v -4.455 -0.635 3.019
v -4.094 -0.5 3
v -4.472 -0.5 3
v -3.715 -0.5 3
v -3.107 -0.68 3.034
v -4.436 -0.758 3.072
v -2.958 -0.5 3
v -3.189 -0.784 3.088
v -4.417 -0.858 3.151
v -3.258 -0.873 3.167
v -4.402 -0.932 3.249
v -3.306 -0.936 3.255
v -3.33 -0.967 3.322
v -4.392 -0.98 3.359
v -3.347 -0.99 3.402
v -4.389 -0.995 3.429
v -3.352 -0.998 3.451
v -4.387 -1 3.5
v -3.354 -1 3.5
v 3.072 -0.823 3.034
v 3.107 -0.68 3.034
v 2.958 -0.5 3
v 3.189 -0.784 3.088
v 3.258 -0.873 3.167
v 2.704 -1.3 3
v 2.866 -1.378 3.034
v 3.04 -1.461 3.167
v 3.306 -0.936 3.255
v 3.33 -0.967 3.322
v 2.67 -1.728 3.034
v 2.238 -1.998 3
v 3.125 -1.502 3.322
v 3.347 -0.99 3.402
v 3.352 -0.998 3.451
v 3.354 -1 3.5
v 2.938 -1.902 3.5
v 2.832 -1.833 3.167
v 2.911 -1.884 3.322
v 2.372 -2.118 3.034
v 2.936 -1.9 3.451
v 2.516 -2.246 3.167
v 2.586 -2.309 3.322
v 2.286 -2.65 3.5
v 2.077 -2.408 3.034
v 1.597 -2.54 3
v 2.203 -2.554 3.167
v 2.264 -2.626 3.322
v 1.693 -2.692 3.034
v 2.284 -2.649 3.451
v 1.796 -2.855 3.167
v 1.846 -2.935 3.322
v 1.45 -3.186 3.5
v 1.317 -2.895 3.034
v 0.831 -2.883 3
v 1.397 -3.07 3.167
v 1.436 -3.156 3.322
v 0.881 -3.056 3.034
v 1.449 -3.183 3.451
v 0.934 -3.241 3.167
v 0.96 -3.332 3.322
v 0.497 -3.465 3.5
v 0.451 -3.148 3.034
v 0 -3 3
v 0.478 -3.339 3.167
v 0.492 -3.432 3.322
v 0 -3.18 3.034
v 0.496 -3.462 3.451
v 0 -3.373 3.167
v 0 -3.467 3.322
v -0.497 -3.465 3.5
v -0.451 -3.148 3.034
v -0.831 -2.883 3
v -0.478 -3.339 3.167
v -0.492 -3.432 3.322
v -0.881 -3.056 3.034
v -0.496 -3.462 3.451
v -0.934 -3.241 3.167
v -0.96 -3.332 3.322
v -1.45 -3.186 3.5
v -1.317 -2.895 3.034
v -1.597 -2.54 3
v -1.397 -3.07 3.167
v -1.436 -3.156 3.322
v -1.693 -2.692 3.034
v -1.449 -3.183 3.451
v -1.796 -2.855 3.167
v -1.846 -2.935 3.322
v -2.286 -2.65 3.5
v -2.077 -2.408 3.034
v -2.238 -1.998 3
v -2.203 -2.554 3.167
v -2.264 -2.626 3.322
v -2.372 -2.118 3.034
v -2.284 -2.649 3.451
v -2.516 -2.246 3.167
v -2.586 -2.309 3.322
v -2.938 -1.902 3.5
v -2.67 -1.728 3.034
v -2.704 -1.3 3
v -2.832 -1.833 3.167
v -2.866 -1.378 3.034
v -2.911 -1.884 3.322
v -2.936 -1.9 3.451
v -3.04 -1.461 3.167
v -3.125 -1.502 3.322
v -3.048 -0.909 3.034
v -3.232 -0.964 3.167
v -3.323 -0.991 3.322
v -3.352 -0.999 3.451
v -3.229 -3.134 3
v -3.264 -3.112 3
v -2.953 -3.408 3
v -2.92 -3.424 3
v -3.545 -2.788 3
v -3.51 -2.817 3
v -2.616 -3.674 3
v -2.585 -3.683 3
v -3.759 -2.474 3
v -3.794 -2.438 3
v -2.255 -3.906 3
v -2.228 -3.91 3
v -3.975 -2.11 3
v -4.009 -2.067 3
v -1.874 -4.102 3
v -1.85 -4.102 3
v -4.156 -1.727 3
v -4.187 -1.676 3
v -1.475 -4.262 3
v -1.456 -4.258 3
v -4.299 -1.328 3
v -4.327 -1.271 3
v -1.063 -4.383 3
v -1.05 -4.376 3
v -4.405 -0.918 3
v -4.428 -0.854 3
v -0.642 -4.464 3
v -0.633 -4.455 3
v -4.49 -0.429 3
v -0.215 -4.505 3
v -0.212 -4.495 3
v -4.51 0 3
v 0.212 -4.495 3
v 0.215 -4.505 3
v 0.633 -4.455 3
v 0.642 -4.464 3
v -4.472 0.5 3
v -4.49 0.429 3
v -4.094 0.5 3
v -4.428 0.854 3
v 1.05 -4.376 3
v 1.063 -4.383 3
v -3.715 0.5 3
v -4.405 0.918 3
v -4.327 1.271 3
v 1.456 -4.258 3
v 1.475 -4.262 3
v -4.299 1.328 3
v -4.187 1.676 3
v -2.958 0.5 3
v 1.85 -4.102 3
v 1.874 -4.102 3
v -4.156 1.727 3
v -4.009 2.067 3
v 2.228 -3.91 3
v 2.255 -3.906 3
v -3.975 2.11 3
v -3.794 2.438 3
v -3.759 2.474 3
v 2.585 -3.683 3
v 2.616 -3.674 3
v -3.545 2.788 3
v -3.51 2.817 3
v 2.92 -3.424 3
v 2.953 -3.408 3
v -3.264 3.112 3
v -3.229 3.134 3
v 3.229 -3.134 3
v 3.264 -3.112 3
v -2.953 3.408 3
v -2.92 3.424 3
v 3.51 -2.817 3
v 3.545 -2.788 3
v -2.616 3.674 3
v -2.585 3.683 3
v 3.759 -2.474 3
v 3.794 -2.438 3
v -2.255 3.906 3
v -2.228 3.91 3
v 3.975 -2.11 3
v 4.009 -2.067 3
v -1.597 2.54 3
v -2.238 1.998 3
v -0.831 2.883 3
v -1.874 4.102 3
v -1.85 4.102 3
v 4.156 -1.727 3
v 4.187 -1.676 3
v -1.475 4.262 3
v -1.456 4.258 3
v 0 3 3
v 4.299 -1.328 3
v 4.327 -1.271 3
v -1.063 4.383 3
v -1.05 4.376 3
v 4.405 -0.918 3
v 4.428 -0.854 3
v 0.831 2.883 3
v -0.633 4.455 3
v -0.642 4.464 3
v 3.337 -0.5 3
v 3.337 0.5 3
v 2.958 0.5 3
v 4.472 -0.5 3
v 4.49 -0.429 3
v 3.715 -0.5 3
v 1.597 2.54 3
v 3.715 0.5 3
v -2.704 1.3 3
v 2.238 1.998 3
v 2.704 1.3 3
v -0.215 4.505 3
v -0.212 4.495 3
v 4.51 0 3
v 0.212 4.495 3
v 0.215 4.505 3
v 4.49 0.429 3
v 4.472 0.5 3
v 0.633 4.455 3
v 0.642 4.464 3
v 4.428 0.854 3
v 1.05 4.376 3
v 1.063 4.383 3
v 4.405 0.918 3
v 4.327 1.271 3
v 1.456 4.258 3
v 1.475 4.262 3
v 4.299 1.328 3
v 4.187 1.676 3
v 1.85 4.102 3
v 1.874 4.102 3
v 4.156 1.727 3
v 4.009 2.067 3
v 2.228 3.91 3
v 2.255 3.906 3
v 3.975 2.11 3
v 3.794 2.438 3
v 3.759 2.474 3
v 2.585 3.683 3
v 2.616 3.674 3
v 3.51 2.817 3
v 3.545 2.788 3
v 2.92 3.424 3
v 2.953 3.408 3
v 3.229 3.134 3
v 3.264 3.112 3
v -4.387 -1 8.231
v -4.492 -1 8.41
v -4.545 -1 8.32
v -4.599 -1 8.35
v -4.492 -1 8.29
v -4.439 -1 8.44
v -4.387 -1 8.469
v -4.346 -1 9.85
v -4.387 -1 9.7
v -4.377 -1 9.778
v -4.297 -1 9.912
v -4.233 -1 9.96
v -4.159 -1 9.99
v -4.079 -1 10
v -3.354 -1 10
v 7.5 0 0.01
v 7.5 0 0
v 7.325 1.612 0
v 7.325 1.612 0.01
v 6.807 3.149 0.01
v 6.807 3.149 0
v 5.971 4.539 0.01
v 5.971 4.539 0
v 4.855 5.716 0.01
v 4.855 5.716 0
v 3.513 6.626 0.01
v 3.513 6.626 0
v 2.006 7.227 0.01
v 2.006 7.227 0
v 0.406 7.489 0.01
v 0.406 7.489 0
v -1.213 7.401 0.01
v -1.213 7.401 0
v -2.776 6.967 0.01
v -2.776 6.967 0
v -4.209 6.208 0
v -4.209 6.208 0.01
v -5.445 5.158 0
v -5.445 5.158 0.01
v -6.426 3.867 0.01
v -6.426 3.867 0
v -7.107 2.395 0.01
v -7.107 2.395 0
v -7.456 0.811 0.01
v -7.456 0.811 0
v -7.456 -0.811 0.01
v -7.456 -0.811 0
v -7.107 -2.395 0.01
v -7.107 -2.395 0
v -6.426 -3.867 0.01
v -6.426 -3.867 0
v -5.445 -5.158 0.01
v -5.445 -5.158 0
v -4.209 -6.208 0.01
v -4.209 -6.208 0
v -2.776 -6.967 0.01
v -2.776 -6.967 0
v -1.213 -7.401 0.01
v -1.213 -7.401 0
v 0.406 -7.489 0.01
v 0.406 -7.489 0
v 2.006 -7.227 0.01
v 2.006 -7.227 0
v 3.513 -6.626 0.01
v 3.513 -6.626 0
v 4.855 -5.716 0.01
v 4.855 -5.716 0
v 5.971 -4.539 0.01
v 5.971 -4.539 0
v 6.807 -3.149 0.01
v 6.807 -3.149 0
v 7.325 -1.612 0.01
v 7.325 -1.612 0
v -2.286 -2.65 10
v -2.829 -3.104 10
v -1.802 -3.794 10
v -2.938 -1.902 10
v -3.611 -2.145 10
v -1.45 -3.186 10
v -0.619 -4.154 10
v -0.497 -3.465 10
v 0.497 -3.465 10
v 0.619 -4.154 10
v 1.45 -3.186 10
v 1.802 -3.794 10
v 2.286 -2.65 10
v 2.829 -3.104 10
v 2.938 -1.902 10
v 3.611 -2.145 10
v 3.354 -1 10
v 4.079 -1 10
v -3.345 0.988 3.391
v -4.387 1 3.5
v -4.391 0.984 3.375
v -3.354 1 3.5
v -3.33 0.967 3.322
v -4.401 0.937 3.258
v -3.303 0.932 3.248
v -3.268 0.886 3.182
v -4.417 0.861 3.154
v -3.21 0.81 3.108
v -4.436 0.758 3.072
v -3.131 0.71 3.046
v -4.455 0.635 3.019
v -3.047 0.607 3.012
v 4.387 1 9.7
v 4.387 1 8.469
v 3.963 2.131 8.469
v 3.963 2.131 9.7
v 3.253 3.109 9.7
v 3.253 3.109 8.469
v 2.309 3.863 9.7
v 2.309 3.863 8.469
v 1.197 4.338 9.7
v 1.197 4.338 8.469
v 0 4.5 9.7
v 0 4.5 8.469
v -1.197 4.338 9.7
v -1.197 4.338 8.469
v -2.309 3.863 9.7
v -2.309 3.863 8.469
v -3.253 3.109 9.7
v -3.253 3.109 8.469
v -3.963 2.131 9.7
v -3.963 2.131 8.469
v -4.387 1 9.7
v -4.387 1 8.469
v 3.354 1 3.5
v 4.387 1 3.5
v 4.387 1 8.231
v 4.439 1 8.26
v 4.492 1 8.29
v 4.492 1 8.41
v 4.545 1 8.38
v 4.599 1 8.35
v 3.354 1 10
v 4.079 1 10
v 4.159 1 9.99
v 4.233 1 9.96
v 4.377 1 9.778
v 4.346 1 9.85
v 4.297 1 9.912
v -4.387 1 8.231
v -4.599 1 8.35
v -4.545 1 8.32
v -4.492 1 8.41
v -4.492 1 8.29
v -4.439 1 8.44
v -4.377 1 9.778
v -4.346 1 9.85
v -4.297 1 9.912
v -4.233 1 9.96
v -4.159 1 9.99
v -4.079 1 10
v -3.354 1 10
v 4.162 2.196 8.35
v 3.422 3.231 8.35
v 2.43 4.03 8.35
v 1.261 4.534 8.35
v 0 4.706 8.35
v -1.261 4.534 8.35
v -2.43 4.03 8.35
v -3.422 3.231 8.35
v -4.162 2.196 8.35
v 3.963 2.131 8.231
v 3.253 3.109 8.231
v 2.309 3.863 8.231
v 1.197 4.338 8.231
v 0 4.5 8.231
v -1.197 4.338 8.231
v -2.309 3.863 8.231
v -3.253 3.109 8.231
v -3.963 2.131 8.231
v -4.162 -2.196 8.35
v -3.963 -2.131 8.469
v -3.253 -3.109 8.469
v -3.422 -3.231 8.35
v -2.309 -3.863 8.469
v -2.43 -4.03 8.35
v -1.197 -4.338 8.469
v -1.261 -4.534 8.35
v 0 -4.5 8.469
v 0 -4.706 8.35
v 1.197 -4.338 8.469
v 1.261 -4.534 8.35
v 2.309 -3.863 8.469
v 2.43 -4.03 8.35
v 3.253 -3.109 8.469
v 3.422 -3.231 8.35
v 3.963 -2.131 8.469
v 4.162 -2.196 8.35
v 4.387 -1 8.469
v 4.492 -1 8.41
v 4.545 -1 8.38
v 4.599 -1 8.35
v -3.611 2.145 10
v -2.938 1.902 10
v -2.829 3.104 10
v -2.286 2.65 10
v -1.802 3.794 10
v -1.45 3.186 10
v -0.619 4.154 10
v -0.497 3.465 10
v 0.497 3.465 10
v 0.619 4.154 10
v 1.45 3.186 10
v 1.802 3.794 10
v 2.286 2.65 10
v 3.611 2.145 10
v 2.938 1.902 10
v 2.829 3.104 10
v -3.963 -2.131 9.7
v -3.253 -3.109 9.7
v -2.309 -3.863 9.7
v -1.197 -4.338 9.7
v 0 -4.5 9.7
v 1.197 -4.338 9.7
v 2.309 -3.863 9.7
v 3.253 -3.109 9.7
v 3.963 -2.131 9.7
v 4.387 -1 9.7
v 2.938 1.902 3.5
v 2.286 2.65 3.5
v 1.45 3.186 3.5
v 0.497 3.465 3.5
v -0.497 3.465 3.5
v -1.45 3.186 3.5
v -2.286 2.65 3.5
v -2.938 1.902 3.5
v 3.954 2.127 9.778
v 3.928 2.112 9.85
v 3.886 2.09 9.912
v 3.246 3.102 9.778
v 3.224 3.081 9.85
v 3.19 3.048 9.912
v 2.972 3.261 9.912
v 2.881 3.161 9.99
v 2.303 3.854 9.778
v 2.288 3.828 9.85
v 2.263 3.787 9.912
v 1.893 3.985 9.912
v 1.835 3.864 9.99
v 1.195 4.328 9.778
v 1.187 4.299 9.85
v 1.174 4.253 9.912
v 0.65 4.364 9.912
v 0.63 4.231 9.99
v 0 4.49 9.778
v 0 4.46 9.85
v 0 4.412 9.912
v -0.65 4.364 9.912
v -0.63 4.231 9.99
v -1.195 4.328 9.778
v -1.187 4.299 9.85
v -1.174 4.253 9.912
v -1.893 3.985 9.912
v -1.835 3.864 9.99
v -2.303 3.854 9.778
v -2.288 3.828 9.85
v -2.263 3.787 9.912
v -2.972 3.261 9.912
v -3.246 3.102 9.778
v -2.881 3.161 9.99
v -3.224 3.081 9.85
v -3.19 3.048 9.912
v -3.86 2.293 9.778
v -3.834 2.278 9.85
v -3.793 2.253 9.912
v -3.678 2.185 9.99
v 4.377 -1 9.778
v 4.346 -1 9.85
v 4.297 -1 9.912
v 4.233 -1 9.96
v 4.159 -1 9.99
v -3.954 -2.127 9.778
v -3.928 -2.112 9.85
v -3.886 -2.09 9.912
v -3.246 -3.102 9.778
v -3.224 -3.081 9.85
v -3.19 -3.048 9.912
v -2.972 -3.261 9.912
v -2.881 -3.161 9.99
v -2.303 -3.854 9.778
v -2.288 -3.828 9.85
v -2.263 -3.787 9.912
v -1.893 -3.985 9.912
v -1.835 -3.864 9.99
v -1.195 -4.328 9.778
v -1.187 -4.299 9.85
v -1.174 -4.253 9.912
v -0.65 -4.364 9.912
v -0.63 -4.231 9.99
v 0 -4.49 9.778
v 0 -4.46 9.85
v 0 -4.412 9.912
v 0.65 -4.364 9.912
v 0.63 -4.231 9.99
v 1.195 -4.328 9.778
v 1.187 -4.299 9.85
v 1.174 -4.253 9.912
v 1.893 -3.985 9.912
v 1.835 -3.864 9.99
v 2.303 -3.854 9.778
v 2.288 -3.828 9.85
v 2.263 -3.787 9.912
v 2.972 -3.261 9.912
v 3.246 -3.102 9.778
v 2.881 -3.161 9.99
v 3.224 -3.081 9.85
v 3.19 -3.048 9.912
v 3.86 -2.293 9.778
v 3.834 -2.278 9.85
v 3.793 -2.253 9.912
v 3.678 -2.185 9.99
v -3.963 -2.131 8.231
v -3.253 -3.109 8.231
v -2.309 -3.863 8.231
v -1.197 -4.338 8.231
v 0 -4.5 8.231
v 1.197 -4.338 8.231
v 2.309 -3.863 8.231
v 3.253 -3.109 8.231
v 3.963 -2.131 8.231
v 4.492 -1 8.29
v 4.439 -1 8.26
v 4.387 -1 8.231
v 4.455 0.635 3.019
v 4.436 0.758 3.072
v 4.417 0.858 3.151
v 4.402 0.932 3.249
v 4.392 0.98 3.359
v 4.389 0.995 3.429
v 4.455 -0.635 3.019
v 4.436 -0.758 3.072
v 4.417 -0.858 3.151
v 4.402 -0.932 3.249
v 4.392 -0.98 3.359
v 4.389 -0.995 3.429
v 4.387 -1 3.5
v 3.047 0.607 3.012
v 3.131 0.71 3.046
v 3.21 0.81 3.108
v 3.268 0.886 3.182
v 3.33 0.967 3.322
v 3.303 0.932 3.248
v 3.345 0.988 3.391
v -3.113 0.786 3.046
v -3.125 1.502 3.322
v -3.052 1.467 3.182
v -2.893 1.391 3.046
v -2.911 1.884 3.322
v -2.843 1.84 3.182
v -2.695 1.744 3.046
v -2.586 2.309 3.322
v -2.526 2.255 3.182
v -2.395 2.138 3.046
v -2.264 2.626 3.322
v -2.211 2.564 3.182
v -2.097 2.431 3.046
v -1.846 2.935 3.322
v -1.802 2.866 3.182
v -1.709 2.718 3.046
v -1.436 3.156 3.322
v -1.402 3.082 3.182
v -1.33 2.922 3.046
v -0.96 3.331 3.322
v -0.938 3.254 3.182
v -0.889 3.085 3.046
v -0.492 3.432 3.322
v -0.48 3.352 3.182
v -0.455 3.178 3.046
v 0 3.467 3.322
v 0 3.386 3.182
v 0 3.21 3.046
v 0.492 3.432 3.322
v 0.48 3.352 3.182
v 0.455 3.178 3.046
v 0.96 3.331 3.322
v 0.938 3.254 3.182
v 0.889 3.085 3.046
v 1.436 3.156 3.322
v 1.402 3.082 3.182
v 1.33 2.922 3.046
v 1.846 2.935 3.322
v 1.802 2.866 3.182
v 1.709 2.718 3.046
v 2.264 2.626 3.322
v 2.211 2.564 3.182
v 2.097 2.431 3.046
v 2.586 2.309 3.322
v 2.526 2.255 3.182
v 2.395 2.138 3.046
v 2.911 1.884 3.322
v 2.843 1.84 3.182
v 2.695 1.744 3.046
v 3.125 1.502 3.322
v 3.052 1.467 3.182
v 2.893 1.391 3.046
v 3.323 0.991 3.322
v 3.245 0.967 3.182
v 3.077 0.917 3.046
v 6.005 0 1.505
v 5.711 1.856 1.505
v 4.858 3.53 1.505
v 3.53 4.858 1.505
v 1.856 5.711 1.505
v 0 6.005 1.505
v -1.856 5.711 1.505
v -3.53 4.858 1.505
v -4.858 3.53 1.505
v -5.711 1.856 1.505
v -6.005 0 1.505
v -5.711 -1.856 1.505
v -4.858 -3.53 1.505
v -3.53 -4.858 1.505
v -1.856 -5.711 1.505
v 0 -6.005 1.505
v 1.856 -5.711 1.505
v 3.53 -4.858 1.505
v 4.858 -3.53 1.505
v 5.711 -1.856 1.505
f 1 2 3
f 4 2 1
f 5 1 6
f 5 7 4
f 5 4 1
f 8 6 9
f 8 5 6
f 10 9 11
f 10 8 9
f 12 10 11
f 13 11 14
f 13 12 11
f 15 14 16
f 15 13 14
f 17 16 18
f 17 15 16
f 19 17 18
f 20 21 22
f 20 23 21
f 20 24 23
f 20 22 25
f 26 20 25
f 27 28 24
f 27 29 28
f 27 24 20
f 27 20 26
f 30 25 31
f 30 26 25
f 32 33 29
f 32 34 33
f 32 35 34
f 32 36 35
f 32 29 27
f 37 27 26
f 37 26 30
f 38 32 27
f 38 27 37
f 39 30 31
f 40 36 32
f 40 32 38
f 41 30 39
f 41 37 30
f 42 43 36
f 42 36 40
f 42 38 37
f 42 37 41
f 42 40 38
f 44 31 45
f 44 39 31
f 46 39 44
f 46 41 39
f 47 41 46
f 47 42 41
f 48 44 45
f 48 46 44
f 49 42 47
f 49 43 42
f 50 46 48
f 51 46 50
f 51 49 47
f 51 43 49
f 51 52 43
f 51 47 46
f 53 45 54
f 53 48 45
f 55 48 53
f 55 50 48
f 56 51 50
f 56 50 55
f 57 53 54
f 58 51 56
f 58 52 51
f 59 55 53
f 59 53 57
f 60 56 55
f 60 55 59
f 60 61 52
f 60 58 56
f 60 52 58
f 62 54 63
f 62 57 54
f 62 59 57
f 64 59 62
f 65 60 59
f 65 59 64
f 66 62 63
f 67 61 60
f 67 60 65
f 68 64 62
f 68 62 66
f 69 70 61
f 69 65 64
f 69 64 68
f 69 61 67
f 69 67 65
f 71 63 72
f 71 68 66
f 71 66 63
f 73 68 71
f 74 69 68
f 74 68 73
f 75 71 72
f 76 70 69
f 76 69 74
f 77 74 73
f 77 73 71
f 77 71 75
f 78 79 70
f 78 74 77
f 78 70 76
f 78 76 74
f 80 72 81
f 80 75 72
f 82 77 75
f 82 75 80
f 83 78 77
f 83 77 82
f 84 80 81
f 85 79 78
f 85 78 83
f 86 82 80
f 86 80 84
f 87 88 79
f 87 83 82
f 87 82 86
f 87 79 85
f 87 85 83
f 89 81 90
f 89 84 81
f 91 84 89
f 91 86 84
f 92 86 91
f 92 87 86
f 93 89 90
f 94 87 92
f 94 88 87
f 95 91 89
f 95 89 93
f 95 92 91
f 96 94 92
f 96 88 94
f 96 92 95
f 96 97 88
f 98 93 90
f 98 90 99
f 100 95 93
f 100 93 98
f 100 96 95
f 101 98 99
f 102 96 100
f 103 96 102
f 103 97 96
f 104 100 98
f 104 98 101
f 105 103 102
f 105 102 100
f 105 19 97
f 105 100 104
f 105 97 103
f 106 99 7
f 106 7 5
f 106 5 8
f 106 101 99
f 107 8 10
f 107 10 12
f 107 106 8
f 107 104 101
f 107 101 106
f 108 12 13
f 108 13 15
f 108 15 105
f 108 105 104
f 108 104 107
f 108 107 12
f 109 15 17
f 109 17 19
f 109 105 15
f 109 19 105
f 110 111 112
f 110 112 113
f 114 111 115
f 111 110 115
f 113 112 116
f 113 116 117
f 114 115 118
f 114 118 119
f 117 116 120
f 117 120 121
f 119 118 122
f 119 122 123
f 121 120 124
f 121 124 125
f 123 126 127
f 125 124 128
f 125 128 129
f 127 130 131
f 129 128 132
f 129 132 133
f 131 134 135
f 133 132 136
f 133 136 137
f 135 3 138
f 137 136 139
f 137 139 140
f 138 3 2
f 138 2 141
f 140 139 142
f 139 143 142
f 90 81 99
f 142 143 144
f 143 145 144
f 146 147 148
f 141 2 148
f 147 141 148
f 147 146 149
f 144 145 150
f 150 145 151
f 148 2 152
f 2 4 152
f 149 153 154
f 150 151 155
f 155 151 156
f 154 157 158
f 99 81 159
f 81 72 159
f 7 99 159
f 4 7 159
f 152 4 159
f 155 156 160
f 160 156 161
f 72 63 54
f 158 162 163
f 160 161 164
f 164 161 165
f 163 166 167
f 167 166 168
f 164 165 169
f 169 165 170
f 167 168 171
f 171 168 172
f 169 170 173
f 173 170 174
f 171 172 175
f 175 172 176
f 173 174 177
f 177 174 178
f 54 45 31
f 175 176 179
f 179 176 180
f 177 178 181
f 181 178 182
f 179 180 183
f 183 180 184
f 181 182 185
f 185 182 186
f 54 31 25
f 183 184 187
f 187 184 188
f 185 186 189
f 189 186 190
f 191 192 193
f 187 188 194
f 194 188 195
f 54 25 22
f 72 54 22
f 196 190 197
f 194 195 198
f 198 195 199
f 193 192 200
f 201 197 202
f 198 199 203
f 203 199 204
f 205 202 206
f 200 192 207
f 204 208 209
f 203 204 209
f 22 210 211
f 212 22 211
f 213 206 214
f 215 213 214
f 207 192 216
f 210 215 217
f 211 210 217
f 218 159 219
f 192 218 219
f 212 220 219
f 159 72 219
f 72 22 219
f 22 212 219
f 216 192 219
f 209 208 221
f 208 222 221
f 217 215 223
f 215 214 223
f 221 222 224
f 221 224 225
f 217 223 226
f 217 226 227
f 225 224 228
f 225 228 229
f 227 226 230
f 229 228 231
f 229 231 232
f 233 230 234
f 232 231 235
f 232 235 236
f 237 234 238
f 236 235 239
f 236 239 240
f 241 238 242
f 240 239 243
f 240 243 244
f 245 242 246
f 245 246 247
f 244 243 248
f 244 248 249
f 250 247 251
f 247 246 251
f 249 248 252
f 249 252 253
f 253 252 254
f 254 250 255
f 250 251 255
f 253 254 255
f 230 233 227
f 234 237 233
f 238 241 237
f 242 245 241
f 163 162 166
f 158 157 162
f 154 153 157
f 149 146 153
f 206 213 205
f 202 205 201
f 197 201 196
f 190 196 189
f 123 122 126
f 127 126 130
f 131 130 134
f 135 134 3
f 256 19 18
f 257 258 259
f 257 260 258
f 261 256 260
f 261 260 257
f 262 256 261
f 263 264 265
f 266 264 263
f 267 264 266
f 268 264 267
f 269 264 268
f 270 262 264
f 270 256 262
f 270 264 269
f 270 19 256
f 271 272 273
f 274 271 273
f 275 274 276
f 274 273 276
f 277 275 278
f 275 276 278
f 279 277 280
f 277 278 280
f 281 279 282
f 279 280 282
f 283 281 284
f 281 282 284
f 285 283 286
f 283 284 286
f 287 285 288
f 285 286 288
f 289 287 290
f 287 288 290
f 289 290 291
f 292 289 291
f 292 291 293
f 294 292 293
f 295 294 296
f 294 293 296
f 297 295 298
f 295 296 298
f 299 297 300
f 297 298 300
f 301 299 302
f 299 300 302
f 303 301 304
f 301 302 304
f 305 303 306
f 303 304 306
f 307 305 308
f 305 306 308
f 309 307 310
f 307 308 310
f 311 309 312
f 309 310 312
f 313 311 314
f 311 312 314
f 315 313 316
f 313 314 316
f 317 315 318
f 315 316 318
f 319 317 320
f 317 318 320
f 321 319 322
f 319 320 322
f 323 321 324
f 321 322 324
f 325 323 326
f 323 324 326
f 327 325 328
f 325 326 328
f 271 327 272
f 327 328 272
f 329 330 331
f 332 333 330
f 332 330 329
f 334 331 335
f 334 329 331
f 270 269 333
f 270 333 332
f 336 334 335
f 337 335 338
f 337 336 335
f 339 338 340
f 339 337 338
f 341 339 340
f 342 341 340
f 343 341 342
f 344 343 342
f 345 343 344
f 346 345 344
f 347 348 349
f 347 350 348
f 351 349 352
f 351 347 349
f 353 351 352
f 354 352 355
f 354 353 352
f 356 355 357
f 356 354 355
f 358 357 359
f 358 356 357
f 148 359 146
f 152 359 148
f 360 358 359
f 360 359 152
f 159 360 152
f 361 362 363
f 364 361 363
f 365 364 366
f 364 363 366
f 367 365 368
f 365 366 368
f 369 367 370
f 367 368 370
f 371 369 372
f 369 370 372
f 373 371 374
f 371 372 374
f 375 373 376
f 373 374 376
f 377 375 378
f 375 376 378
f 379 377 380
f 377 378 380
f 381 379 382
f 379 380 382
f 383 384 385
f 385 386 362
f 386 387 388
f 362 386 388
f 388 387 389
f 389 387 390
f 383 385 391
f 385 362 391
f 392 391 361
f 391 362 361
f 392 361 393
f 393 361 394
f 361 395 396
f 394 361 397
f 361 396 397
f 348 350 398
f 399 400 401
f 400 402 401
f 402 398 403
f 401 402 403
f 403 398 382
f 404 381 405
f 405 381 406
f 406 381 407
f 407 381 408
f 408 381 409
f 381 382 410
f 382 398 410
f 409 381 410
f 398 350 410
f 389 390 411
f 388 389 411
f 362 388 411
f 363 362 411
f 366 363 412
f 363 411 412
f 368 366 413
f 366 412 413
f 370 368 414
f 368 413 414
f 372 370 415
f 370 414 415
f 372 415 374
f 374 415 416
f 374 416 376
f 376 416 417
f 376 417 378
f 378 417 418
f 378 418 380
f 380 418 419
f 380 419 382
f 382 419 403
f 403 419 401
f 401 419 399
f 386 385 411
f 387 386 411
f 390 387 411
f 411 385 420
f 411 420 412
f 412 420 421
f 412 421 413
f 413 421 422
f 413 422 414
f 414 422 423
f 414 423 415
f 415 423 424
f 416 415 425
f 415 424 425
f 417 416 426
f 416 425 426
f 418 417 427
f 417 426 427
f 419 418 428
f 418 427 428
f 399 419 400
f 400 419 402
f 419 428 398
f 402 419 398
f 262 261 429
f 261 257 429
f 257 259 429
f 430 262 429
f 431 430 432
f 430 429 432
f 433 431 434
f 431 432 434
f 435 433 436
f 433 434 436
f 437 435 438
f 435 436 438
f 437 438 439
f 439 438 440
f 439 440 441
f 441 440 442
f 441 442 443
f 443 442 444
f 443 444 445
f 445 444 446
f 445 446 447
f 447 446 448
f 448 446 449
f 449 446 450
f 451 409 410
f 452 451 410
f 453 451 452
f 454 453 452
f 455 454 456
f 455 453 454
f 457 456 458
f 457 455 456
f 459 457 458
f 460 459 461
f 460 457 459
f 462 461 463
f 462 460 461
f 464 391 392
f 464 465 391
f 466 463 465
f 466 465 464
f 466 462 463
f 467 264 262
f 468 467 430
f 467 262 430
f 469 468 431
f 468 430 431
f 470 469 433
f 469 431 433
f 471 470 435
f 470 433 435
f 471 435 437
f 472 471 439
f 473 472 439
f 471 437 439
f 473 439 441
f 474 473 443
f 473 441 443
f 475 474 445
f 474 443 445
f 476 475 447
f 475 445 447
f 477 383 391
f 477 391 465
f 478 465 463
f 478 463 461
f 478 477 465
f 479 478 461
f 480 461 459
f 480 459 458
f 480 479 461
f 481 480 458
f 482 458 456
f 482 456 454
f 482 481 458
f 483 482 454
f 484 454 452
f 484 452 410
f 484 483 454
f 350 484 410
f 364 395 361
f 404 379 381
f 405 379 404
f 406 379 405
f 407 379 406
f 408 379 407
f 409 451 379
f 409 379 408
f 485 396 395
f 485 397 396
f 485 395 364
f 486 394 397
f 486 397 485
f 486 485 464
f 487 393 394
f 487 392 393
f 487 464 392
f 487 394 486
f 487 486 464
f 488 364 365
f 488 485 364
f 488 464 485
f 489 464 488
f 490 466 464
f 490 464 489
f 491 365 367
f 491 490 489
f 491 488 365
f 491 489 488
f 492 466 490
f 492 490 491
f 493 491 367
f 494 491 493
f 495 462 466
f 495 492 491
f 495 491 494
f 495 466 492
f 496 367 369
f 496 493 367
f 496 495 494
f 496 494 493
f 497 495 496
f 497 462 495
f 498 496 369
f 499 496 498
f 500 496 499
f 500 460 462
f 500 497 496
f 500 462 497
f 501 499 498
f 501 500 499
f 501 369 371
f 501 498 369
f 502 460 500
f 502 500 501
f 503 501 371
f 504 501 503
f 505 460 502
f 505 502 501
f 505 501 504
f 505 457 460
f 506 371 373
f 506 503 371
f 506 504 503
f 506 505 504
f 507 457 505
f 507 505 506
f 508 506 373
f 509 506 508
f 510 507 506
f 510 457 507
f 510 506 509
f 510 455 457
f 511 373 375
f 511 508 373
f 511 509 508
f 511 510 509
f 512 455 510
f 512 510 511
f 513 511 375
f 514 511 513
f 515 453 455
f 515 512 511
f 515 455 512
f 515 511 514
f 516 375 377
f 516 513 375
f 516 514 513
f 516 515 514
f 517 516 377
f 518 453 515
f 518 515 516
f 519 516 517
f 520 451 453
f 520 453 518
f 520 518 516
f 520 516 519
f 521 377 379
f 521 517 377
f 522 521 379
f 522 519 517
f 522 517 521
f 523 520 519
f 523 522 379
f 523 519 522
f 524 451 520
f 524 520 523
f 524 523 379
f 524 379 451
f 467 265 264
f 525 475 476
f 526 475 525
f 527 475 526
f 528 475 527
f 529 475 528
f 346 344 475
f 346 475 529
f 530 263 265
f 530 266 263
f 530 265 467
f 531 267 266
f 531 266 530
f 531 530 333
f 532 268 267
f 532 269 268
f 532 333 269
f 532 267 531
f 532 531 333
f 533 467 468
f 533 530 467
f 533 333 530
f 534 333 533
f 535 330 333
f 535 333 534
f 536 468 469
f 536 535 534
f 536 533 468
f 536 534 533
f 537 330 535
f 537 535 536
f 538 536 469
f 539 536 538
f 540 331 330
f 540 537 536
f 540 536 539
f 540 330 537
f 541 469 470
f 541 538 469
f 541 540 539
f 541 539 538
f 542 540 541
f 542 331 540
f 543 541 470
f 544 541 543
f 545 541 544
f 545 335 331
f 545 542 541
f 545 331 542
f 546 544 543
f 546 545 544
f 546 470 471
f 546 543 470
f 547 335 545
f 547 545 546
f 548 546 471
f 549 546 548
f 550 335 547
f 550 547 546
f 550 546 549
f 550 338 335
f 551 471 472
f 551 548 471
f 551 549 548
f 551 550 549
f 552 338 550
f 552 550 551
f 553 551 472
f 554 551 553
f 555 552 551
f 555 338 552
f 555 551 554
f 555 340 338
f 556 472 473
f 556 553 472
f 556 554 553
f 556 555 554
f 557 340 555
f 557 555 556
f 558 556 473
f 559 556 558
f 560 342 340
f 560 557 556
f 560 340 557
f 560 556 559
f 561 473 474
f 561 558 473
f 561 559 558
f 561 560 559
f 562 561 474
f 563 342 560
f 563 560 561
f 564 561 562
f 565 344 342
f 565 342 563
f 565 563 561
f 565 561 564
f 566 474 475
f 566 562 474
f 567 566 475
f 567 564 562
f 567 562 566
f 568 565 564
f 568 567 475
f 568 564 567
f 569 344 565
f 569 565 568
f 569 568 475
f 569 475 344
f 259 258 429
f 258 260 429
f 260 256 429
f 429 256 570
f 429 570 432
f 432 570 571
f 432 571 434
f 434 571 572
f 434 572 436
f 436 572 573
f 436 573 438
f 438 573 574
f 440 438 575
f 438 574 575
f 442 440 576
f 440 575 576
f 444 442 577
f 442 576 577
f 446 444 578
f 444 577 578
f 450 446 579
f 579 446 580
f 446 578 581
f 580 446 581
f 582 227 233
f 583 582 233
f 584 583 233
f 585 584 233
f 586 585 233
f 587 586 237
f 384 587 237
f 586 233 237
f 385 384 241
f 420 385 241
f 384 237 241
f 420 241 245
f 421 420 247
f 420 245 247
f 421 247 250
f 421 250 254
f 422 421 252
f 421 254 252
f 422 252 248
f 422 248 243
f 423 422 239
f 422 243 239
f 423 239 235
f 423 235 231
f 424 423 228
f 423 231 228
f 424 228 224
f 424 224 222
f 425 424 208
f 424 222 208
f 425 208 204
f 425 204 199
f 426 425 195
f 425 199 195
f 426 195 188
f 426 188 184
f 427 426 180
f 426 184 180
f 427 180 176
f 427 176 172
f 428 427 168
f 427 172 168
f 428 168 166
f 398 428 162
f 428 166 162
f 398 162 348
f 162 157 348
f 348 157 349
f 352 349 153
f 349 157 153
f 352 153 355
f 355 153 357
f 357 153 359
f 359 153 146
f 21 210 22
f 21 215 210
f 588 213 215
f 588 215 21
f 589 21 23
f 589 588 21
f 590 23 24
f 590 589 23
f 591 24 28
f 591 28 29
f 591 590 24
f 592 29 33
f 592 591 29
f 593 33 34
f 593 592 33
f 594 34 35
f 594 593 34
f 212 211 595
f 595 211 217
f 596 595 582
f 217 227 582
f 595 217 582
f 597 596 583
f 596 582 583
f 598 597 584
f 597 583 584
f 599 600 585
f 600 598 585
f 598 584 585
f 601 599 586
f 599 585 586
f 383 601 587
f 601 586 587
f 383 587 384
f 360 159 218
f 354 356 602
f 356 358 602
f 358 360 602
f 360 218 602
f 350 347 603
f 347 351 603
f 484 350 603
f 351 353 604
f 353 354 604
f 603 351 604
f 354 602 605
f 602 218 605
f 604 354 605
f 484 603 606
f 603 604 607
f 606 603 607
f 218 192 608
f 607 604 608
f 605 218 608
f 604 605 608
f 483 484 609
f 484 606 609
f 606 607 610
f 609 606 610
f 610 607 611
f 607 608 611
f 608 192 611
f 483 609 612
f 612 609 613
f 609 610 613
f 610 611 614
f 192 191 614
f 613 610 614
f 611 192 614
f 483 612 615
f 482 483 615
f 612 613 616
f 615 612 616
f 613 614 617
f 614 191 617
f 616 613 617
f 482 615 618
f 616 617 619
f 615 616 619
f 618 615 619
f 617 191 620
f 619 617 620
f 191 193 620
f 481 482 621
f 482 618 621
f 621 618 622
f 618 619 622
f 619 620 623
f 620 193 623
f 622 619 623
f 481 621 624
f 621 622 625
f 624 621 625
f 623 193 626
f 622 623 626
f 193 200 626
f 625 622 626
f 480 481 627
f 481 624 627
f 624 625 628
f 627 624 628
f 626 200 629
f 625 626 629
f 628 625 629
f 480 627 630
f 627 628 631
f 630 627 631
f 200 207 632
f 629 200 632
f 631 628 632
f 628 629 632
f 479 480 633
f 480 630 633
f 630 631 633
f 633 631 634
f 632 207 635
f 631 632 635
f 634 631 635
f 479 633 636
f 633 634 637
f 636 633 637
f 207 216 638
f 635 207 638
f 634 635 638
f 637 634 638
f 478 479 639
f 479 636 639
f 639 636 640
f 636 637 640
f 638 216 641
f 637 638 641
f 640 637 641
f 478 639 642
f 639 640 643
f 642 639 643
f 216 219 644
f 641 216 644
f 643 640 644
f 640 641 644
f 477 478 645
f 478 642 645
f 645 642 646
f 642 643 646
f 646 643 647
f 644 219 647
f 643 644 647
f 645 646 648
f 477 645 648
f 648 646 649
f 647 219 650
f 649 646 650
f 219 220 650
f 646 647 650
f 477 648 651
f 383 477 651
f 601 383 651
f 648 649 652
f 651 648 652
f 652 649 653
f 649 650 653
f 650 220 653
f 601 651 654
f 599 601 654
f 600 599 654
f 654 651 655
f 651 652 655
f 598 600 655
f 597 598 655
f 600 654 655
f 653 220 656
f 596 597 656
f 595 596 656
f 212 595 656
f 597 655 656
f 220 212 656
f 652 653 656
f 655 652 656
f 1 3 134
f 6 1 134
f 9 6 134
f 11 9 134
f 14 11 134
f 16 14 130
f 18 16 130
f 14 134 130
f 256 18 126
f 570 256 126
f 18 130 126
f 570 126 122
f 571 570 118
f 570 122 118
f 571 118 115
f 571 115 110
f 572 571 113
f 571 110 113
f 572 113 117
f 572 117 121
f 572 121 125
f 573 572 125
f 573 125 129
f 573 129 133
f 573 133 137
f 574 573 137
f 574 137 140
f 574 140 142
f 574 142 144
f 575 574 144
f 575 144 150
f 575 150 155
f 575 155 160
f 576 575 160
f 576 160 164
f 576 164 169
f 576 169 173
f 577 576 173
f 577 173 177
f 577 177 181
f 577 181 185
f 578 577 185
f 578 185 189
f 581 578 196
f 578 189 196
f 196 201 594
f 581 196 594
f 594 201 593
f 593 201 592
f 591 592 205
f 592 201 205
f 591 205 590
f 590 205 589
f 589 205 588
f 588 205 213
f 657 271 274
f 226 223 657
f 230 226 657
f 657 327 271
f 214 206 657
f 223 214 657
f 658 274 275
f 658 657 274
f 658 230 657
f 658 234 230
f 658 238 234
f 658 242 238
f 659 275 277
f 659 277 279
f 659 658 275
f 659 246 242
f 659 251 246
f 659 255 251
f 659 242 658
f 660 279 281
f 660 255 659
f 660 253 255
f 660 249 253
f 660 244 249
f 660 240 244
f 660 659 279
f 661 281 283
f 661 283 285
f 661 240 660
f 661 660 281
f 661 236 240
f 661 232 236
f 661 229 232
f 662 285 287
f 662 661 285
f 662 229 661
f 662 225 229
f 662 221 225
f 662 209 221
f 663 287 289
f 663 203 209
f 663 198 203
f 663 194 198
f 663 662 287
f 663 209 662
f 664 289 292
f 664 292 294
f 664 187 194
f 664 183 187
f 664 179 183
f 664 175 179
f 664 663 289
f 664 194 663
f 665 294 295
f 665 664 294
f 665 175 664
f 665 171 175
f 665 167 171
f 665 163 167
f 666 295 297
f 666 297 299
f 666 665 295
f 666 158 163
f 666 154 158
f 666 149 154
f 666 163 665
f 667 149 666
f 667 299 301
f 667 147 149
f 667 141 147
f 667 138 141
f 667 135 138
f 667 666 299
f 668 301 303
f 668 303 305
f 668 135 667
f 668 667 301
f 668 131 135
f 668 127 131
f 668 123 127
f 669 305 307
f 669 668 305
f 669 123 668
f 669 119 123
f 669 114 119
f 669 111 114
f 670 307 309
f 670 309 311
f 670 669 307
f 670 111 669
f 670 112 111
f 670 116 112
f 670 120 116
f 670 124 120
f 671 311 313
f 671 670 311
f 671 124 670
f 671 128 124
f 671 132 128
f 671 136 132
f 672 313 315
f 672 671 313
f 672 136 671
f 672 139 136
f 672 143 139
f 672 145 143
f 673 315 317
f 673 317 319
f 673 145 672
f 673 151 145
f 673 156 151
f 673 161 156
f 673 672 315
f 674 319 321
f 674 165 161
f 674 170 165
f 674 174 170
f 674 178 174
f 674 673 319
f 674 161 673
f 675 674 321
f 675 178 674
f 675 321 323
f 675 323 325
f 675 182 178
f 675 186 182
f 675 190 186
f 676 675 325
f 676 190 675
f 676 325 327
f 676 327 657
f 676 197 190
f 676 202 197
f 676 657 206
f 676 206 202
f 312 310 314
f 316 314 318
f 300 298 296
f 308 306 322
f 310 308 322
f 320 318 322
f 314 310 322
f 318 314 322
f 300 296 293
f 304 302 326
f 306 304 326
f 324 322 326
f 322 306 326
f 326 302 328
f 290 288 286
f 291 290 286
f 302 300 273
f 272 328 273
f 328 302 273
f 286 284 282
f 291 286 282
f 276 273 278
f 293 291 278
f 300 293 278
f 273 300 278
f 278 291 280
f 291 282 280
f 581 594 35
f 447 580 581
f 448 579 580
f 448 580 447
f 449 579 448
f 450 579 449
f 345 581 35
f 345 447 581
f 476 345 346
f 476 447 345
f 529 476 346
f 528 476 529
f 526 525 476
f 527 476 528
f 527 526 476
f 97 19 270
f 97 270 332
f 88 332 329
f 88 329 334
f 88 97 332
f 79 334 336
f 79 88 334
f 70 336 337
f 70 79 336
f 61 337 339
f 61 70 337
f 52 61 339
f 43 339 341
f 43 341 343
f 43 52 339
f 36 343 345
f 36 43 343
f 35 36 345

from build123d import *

# Parameters (mm, degrees)
SKETCH_R     = 4.5
SKETCH_R_2   = 3.5
PAD_DEPTH    = 10
SKETCH001_R  = 7.5
PAD001_DEPTH = 3
CHAMFER_SIZE = 2.99
SKETCH003_W  = 2
SKETCH003_H  = 10
POCKET_DEPTH = 6
FILLET_R     = 0.5
FILLET001_R  = 0.3


with BuildPart() as part:
    # Sketch (on XY_Plane of Origin) → Pad (new body)
    with BuildSketch(Plane.XY):
        Circle(SKETCH_R)
        Circle(SKETCH_R_2, mode=Mode.SUBTRACT)
    extrude(amount=PAD_DEPTH)

    # Sketch001 (on XY_Plane of Origin) → Pad001 (join)
    with BuildSketch(Plane.XY):
        Circle(SKETCH001_R)
    extrude(amount=PAD001_DEPTH)

    # Chamfer
    chamfer_edges = [part.edges().sort_by_distance(p)[0] for p in [
        (-7.5, 0, 3),
    ]]
    chamfer(chamfer_edges, length=CHAMFER_SIZE)

    # Sketch002 (on YZ_Plane of Origin) → Revolution (revolve)
    with BuildSketch(Plane.YZ):
        Polygon((4.1, 8.7), (4.706218, 8.35), (4.1, 8), align=None)
    revolve(axis=Axis((0, 0, 0), (0, 0, 1)))

    # Sketch003 (on YZ_Plane of Origin) → Pocket (cut, symmetric)
    with BuildSketch(Plane.YZ):
        with Locations((0, 8)):
            Rectangle(SKETCH003_W, SKETCH003_H)
    extrude(amount=POCKET_DEPTH, both=True, mode=Mode.SUBTRACT)

    # Fillet
    fillet_edges = [part.edges().sort_by_distance(p)[0] for p in [
        (0, -3.5, 3),
        (0, 3.5, 3),
        (3.870792, 1, 3),
        (-3.870792, 1, 3),
        (3.870792, -1, 3),
        (-3.870792, -1, 3),
    ]]
    fillet(fillet_edges, radius=FILLET_R)

    # Fillet001
    fillet001_edges = [part.edges().sort_by_distance(p)[0] for p in [
        (0, 4.5, 10),
        (0, -4.5, 10),
    ]]
    fillet(fillet001_edges, radius=FILLET001_R)


solid = part.part
